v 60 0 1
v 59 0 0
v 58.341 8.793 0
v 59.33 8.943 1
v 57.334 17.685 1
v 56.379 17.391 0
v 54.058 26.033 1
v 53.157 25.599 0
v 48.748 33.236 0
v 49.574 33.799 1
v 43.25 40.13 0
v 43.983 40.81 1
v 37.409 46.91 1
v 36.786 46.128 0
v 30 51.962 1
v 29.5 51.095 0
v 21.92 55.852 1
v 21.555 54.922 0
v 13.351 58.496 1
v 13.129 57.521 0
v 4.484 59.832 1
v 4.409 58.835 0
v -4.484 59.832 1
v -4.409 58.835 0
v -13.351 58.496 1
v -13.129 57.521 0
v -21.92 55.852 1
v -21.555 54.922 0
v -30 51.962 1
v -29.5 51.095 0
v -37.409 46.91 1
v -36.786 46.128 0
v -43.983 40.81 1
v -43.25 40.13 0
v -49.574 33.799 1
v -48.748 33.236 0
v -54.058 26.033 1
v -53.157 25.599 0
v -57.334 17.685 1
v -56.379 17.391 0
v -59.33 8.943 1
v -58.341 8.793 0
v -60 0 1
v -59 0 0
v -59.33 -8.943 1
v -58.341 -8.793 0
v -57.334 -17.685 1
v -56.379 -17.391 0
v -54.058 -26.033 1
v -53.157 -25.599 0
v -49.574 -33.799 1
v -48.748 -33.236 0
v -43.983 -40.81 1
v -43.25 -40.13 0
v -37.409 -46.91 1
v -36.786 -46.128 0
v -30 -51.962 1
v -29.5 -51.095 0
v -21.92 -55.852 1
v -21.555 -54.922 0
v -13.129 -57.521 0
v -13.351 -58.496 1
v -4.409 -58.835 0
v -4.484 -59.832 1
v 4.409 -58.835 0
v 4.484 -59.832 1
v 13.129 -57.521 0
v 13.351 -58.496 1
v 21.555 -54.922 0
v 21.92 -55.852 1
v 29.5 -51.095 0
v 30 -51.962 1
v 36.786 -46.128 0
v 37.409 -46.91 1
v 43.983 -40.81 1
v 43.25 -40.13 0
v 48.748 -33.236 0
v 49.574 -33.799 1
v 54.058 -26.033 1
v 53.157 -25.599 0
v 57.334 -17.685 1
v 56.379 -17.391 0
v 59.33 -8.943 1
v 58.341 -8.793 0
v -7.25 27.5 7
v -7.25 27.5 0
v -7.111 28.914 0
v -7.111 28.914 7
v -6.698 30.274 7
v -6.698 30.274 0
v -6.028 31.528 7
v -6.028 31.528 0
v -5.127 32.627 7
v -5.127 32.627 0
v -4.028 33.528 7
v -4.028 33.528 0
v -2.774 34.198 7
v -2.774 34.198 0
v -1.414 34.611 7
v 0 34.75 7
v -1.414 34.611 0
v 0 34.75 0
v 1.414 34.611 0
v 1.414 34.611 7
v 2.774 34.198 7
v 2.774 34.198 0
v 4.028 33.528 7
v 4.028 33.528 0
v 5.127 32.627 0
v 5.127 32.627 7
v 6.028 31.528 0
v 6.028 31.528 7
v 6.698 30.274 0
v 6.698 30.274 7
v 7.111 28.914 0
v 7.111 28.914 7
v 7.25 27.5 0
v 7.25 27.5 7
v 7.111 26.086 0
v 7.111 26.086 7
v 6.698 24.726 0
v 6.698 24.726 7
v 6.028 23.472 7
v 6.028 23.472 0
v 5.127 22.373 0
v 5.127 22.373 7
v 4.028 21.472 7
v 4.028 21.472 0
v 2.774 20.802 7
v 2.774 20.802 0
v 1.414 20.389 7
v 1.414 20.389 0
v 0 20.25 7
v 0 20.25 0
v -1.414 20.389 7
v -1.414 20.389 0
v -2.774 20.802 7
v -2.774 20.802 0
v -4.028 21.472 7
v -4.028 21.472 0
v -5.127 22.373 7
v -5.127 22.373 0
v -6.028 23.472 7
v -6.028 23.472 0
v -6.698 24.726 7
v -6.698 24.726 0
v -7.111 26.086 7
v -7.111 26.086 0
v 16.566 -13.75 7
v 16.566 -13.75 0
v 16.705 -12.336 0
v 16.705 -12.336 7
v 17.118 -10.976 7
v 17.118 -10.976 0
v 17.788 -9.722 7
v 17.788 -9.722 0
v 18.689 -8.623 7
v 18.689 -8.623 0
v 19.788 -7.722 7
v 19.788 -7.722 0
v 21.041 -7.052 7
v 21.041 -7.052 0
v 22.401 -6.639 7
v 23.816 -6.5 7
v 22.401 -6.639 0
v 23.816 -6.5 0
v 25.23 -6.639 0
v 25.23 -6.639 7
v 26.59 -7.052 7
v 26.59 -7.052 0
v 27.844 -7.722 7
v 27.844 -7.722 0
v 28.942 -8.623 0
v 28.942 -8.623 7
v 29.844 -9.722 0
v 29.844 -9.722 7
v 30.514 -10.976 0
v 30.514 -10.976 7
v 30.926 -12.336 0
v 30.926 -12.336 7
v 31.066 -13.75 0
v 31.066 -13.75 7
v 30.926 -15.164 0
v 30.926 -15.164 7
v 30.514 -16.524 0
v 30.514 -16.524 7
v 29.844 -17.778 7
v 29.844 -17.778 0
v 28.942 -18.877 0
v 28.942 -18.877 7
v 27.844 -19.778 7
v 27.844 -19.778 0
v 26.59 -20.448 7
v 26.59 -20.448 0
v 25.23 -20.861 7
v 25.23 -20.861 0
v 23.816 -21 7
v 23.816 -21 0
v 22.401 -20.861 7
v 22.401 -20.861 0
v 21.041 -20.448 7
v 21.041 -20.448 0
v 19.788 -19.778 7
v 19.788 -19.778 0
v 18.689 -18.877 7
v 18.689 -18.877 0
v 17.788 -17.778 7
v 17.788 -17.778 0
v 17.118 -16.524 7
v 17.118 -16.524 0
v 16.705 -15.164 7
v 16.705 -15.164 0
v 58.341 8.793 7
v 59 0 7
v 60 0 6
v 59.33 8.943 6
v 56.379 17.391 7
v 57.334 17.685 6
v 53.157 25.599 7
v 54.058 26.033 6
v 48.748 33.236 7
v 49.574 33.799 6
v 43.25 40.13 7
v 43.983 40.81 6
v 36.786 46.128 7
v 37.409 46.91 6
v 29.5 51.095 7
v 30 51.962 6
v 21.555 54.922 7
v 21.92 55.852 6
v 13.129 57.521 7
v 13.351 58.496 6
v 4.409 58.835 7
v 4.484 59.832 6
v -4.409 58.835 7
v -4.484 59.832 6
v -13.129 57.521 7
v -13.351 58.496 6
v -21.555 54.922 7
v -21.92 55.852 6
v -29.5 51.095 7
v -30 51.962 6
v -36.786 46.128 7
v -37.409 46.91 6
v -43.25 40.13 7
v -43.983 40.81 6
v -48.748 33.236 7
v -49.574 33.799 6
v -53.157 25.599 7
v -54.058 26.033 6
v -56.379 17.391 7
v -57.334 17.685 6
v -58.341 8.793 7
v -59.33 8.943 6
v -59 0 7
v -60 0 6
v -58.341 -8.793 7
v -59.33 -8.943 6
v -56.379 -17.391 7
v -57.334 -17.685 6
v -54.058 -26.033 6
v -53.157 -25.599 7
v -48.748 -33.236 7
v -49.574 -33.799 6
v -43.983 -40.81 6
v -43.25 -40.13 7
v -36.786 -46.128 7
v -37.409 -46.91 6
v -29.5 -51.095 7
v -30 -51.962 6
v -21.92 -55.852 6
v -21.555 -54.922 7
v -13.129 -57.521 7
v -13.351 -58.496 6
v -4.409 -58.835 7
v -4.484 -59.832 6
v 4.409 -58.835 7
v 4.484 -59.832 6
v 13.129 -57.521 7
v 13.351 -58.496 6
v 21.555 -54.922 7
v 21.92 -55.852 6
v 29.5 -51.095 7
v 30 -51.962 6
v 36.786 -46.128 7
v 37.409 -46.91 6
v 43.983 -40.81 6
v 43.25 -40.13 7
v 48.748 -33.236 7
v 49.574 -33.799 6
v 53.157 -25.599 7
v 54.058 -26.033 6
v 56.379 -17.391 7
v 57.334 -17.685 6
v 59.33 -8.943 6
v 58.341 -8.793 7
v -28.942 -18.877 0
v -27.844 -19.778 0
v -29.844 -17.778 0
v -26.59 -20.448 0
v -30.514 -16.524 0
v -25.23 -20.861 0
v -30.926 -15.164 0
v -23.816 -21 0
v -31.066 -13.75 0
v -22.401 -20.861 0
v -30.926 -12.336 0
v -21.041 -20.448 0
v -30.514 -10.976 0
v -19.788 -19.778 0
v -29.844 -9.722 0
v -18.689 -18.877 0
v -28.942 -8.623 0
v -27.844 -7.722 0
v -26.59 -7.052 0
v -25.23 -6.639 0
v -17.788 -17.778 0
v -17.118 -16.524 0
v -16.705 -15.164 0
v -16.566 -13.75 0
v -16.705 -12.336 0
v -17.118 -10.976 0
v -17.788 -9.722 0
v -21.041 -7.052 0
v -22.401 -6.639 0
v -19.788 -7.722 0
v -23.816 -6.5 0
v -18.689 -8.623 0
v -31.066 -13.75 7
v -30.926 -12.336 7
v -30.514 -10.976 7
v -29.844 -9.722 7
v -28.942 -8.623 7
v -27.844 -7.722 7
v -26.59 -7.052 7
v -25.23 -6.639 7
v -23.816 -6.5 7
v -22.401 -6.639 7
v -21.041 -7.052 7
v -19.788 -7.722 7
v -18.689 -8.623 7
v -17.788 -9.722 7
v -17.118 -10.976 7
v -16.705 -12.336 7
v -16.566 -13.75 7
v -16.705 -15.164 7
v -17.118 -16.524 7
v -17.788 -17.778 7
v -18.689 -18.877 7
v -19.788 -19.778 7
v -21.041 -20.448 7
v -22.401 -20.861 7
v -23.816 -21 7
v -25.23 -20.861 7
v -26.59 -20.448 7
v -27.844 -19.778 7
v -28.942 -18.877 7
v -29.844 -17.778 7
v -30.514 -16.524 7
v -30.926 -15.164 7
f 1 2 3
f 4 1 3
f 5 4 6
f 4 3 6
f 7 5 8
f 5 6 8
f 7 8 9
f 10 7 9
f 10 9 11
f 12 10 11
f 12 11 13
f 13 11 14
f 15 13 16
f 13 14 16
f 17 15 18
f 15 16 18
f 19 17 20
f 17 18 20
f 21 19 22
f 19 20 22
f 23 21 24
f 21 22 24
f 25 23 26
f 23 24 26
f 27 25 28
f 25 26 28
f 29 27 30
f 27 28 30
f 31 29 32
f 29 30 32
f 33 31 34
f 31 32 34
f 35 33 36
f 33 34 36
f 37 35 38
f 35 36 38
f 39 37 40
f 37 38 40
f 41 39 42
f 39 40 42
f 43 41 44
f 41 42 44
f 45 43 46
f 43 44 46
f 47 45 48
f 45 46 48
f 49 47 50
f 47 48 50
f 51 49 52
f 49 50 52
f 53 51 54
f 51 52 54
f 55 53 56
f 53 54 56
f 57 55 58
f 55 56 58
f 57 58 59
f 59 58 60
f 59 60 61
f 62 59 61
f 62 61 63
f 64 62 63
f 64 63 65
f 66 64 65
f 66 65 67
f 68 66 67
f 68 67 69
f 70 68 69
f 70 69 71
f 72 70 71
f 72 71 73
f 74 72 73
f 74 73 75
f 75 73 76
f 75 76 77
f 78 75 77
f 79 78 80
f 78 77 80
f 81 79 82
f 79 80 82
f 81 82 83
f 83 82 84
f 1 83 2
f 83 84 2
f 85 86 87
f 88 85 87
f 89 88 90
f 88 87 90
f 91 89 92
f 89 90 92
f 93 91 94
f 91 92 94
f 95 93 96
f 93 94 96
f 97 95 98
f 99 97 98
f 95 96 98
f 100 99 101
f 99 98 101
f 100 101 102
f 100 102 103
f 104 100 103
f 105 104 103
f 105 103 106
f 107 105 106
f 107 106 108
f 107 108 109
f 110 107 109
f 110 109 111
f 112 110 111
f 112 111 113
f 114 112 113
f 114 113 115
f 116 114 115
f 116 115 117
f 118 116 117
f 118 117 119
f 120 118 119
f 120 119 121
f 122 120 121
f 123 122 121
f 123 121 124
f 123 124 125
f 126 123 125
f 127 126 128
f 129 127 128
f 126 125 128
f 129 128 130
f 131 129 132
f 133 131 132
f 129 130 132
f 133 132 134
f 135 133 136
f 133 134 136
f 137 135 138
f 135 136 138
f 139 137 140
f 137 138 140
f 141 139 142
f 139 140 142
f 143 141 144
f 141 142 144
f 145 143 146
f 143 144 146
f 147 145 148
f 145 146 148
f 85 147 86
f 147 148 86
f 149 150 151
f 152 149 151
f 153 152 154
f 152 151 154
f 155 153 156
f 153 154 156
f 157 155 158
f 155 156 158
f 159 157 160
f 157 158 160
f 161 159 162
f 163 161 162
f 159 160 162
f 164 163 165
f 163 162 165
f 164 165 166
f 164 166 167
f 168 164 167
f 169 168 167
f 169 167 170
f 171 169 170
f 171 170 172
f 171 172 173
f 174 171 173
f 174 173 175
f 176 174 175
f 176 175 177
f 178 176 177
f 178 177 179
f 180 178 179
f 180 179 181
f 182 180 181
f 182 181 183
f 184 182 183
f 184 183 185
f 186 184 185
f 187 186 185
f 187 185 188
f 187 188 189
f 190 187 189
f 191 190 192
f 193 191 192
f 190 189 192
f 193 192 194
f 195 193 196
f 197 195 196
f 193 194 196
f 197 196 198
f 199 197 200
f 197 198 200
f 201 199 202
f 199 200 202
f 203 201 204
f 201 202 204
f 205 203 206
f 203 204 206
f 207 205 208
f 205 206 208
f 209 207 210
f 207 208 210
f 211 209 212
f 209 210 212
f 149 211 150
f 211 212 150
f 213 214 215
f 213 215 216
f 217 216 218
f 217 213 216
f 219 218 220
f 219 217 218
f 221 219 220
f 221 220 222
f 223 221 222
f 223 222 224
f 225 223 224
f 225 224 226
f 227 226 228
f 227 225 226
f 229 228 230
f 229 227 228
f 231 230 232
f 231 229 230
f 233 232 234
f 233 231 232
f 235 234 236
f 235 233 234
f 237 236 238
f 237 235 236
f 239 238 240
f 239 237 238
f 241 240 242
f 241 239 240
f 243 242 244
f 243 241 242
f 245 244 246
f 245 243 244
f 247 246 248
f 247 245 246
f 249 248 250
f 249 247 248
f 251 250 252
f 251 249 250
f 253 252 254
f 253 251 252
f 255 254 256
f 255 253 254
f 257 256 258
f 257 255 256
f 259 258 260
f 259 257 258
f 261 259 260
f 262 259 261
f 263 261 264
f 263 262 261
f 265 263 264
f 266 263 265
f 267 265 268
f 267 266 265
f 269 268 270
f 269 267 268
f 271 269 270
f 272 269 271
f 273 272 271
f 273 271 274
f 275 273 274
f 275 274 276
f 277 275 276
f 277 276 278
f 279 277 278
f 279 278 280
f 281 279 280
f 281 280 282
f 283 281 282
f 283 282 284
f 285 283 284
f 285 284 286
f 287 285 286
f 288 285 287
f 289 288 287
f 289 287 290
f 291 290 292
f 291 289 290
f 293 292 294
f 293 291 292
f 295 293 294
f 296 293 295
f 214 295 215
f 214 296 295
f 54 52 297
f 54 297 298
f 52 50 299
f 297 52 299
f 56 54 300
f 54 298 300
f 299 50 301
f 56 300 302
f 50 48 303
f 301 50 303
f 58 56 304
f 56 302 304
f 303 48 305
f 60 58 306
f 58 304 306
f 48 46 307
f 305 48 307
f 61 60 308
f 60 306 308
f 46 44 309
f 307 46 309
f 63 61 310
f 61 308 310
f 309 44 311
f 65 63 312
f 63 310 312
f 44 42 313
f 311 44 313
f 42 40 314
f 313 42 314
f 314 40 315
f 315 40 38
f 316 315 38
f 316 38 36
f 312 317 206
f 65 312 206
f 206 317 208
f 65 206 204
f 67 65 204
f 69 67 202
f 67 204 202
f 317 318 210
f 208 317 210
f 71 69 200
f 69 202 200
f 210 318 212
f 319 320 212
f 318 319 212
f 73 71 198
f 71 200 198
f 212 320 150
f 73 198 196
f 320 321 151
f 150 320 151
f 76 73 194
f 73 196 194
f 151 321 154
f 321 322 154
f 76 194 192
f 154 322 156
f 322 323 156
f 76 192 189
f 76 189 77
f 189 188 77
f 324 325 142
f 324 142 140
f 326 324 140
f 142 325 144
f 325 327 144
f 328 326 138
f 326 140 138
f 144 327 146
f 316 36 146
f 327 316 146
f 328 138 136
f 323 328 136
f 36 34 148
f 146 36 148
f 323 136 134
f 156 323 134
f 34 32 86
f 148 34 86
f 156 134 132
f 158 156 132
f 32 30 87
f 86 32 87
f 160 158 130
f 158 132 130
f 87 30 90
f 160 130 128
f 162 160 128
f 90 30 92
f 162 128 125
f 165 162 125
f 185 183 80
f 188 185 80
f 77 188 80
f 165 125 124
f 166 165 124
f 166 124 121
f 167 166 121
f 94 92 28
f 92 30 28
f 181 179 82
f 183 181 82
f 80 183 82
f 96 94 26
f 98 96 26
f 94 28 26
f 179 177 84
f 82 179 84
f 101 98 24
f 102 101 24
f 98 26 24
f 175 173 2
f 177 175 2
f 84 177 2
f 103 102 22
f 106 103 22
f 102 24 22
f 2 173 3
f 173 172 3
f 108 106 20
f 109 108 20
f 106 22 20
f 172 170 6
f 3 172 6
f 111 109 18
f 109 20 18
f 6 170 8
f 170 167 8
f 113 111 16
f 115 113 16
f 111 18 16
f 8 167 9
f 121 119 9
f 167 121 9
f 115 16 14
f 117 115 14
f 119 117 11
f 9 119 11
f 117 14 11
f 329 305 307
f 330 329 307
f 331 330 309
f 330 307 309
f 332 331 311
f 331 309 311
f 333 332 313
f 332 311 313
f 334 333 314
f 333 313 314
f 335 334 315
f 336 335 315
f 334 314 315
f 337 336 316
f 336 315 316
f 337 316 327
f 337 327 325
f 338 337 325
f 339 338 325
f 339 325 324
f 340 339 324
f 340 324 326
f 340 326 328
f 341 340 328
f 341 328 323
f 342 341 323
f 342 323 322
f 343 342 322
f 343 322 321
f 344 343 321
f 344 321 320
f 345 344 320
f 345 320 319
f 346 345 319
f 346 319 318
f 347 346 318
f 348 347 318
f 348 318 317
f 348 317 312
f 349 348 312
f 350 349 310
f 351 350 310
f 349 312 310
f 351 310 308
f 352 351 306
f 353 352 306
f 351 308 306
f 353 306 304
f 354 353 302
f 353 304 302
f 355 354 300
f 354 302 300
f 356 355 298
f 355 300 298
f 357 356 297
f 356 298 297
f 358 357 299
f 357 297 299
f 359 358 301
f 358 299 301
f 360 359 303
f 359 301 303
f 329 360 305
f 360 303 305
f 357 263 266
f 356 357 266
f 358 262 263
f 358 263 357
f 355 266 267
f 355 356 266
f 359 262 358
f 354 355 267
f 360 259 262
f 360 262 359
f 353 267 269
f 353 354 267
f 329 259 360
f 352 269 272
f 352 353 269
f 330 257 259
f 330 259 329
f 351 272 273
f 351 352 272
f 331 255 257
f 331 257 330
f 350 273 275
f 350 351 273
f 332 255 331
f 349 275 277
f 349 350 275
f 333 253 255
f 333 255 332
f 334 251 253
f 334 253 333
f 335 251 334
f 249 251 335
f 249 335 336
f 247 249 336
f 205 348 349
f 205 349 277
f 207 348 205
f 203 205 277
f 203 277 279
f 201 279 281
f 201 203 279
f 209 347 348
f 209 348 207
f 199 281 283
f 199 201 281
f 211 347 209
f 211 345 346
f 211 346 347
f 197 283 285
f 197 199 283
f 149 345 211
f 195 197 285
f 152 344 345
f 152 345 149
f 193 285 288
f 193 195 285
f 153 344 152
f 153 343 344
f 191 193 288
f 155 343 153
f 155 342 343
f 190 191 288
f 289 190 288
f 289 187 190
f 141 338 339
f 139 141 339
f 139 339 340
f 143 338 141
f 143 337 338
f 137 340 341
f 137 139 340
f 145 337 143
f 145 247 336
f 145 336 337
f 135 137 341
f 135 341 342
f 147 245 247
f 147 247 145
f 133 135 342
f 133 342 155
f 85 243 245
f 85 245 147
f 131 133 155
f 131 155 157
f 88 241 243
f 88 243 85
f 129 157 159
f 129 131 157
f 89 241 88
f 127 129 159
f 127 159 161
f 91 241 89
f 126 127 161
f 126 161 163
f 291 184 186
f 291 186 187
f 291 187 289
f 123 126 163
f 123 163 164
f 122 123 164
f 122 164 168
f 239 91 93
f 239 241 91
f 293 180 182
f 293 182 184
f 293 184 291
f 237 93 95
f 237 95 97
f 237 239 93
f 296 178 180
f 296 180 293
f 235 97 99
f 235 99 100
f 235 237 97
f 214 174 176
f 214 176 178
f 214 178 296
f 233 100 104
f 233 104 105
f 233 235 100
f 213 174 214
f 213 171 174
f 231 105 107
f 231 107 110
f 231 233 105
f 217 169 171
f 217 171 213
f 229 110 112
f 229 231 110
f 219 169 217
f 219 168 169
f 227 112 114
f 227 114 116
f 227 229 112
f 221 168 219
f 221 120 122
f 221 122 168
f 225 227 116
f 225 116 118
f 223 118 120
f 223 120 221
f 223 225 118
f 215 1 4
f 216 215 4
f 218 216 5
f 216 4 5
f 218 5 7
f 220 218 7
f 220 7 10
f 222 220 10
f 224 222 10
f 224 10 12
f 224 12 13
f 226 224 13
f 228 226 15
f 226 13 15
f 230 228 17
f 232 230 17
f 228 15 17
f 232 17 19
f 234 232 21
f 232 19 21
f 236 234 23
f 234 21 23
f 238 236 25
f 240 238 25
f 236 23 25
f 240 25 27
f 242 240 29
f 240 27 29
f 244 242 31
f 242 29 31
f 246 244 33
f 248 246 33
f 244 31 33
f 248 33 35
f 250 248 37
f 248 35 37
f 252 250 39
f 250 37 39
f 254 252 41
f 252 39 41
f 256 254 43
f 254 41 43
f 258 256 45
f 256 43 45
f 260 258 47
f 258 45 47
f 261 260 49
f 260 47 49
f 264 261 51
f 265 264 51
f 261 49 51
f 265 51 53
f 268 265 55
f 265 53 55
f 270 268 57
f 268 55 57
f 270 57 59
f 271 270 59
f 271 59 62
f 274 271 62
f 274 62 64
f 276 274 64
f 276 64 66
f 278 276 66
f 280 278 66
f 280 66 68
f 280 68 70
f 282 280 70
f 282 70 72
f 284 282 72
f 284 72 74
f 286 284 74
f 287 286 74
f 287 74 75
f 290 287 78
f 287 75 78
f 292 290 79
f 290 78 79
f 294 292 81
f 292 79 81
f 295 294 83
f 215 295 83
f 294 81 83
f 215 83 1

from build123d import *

# Parameters (mm, degrees)
F0_R     = 60
F1_DEPTH = 7
F2_SIZE  = 1
F4_D     = 14.5


with BuildPart() as f1:
    # F0 (on Top) → F1 (new body)
    with BuildSketch(Plane.XY):
        Circle(F0_R)
    extrude(amount=F1_DEPTH)

    # F2
    f2_edges = [f1.edges().sort_by_distance(p)[0] for p in [
        (-60, 0, 7),
        (-60, 0, 0),
    ]]
    chamfer(f2_edges, length=F2_SIZE)

    # F4 (through all)
    with Locations(Plane.XY.offset(7)):
        with Locations((0, 27.5), (23.8156986041, -13.75), (-23.8156986041, -13.75)):
            Hole(F4_D / 2)


solid = f1.part
